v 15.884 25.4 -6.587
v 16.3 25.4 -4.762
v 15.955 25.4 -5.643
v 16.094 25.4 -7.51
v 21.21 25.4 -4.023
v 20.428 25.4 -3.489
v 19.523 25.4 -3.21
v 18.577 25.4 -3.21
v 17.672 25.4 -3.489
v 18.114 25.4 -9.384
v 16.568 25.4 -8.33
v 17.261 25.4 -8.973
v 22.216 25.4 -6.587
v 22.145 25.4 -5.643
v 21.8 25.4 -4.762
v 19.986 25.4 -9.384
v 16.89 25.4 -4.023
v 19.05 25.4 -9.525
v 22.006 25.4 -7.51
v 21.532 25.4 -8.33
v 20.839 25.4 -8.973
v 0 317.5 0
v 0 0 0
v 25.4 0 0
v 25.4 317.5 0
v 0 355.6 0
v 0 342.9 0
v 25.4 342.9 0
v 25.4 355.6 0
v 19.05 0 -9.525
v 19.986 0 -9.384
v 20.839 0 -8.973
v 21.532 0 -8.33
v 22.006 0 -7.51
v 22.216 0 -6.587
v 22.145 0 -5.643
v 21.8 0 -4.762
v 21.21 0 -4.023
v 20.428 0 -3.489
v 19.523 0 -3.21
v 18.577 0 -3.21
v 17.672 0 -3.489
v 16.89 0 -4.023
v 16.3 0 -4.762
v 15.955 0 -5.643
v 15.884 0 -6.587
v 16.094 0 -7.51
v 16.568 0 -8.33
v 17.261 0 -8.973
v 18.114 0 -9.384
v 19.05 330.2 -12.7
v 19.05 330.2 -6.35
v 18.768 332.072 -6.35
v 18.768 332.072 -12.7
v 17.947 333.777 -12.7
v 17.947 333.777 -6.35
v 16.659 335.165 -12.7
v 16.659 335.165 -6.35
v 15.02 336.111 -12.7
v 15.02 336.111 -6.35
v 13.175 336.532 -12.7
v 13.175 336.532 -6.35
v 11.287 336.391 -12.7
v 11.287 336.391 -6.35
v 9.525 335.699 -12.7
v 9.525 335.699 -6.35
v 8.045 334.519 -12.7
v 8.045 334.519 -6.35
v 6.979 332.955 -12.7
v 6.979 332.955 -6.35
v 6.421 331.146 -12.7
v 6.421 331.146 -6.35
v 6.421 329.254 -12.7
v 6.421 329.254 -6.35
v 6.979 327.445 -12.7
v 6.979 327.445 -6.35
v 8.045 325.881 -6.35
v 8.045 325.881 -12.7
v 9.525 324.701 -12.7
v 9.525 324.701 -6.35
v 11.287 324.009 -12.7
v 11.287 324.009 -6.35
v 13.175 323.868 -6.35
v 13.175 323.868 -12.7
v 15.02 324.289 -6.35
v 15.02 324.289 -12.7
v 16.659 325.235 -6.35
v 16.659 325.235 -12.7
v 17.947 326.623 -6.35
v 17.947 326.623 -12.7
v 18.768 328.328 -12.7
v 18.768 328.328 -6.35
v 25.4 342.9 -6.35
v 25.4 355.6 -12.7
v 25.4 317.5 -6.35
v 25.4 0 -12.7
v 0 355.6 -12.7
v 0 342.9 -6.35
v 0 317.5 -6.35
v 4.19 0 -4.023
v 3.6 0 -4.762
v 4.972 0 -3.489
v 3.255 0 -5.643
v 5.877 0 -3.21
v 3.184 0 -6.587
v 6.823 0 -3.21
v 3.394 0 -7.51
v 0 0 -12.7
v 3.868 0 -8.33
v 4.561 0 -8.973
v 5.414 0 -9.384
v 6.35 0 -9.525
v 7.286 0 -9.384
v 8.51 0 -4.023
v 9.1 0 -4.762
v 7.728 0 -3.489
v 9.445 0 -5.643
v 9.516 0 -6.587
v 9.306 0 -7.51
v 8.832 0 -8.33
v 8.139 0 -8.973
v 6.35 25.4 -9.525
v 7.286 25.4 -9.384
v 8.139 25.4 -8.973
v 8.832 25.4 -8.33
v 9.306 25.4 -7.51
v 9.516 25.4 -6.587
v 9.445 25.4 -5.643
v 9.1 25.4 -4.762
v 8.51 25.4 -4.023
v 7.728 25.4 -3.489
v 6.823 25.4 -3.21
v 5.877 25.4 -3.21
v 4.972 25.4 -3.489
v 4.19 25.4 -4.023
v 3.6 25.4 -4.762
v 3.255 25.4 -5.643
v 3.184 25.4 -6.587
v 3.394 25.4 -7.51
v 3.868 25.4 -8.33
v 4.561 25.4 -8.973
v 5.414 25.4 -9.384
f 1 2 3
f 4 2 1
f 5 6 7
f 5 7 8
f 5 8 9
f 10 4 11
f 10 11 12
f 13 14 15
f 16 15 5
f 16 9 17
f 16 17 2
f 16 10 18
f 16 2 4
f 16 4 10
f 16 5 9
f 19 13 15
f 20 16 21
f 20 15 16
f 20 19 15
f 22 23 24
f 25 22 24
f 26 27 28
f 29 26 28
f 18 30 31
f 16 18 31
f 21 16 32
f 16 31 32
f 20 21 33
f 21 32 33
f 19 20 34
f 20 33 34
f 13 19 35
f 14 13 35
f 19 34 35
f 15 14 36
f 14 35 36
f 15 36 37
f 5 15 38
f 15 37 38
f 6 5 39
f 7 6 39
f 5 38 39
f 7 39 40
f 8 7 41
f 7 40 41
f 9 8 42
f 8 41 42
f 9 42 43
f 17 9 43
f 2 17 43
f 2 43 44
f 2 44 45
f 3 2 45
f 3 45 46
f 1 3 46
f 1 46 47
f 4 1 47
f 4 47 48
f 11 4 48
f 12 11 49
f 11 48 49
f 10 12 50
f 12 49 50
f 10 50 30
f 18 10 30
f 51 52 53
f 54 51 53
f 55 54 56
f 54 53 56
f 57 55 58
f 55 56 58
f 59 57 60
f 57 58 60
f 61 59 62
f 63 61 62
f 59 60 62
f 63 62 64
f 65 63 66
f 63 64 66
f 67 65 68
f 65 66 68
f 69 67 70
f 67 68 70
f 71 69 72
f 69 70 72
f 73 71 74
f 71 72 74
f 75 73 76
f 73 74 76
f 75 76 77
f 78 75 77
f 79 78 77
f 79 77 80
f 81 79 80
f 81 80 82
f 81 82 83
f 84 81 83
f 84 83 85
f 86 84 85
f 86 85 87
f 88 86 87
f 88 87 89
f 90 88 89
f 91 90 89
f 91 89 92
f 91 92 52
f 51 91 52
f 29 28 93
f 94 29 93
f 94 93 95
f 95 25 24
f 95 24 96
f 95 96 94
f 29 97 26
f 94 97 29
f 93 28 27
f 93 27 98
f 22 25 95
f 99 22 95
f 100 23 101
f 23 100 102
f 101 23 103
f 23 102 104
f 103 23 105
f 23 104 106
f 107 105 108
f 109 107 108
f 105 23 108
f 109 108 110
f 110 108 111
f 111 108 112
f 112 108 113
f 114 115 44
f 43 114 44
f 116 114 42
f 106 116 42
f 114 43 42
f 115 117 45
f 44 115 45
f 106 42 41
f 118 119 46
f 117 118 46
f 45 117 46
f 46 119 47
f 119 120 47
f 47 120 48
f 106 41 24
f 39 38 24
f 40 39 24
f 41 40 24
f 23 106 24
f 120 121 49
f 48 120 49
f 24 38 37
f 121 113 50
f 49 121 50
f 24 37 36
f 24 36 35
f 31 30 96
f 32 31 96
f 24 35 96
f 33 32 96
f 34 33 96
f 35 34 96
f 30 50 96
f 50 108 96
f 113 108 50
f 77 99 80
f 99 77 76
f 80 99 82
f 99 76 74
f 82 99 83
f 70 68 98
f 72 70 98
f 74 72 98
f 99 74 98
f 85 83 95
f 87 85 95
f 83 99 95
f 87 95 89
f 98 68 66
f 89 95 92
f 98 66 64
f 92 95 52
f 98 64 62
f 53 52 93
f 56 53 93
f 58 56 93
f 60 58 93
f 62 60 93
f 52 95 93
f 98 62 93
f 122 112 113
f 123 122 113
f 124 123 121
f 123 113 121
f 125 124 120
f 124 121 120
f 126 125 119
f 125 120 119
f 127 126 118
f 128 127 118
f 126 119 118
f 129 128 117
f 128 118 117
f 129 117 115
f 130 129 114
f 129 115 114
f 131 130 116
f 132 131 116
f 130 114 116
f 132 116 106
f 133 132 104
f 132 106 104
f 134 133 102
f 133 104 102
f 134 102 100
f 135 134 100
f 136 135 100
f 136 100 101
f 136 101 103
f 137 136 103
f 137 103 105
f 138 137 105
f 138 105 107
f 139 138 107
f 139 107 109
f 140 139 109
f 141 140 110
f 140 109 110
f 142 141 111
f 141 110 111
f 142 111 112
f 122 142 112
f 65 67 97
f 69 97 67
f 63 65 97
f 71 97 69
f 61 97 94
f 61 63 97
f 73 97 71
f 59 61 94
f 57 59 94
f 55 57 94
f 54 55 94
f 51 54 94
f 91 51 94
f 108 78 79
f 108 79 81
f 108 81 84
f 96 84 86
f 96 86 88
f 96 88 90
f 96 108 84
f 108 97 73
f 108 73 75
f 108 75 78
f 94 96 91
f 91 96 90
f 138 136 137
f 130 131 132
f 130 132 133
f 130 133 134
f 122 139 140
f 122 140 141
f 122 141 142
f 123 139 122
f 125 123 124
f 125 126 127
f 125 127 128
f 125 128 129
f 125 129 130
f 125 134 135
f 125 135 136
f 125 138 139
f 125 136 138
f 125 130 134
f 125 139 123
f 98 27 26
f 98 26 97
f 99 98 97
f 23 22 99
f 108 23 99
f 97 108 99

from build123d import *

# Parameters (mm, degrees)
SKETCH1_W           = 25.4
SKETCH1_H           = 12.7
BOSS_EXTRUDE1_DEPTH = 355.6
SKETCH2_W           = 6.35
SKETCH2_H           = 25.4
CUT_EXTRUDE1_DEPTH  = 357.732126392
SKETCH3_R           = 6.35
CUT_EXTRUDE2_DEPTH  = 357.562536591
SKETCH4_R           = 3.175
CUT_EXTRUDE3_DEPTH  = 25.4


with BuildPart() as part:
    # Sketch1 → Boss-Extrude1 (new body)
    with BuildSketch(Plane(origin=(0, 0, 0), x_dir=(1, 0, 0), z_dir=(0, 1, 0))):
        with Locations((12.7, 6.35)):
            Rectangle(SKETCH1_W, SKETCH1_H)
    extrude(amount=BOSS_EXTRUDE1_DEPTH)

    # Sketch2 → Cut-Extrude1 (cut, through all)
    with BuildSketch(Plane(origin=(25.4, 0, 0), x_dir=(0, 0, -1), z_dir=(1, 0, 0))):
        with Locations((3.175, 330.2)):
            Rectangle(SKETCH2_W, SKETCH2_H)
    extrude(amount=-CUT_EXTRUDE1_DEPTH, mode=Mode.SUBTRACT)

    # Sketch3 → Cut-Extrude2 (cut, through all)
    with BuildSketch(Plane.XY.offset(-6.35)):
        with Locations((12.7, 330.2)):
            Circle(SKETCH3_R)
    extrude(amount=-CUT_EXTRUDE2_DEPTH, mode=Mode.SUBTRACT)

    # Sketch4 → Cut-Extrude3 (cut)
    with BuildSketch(Plane.XZ):
        with Locations(Location((6.35, -6.35, 0), (0, 0, 270))):
            Circle(SKETCH4_R)
        with Locations(Location((19.05, -6.35, 0), (0, 0, 270))):
            Circle(SKETCH4_R)
    extrude(amount=-CUT_EXTRUDE3_DEPTH, mode=Mode.SUBTRACT)


solid = part.part
